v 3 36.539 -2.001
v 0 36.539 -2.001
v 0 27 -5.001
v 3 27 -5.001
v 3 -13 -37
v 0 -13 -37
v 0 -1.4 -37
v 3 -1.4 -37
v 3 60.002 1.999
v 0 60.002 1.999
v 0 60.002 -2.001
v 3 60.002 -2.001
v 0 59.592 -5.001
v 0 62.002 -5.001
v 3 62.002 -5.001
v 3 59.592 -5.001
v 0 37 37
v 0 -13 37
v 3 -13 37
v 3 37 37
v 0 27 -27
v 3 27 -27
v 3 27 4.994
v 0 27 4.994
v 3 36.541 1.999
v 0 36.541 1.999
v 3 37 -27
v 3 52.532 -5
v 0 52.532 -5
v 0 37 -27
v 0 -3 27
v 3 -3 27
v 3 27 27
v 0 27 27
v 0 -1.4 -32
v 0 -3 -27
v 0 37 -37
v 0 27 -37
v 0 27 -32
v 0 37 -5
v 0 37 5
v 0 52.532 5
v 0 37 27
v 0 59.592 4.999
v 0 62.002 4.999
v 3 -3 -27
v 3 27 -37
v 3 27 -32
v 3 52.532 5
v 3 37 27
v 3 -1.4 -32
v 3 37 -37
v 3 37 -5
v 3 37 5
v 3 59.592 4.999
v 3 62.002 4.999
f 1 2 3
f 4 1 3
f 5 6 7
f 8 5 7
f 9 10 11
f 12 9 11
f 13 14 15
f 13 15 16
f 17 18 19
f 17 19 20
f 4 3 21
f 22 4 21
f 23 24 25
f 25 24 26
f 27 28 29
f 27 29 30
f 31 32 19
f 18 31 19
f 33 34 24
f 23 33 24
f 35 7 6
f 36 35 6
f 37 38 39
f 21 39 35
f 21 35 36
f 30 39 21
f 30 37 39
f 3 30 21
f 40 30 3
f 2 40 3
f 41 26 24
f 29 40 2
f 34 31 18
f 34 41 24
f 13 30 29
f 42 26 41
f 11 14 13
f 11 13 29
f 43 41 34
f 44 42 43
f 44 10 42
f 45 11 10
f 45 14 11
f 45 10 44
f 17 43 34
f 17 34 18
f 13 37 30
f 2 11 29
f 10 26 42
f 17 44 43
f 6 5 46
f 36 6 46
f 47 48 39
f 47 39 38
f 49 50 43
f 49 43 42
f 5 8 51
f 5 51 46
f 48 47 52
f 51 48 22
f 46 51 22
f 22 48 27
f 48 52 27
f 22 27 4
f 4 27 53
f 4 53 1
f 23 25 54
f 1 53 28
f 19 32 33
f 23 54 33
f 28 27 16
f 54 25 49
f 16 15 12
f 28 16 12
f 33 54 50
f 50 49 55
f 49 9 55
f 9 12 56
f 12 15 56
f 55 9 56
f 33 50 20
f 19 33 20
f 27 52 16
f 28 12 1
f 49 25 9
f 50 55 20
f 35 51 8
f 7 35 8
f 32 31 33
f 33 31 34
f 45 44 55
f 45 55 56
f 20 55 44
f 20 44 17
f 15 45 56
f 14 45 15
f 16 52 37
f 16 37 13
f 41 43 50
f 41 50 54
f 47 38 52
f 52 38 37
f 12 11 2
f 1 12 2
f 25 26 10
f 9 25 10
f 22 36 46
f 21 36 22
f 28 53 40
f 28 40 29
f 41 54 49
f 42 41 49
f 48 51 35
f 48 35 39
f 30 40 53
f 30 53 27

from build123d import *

# Parameters (mm, degrees)
SKETCH2_W           = 74
SKETCH2_H           = 74
SKETCH2_W_2         = 54
SKETCH2_H_2         = 54
BOSS_EXTRUDE1_DEPTH = 3
SKETCH3_W           = 10
SKETCH3_H           = 25
BOSS_EXTRUDE2_DEPTH = 3
CUT_EXTRUDE1_DEPTH  = 3
BOSS_EXTRUDE3_DEPTH = 3
CUT_EXTRUDE2_DEPTH  = 3
CUT_EXTRUDE3_DEPTH  = 3
CUT_EXTRUDE4_DEPTH  = 3
BOSS_EXTRUDE4_DEPTH = 3
CUT_EXTRUDE6_DEPTH  = 3
SKETCH12_W          = 5
SKETCH12_H          = 28.4
CUT_EXTRUDE7_DEPTH  = 3


with BuildPart() as part:
    # Sketch2 → Boss-Extrude1 (new body)
    with BuildSketch(Plane(origin=(0, 0, 0), x_dir=(0, 0, -1), z_dir=(1, 0, 0))):
        Rectangle(SKETCH2_W, SKETCH2_H)
        Rectangle(SKETCH2_W_2, SKETCH2_H_2, mode=Mode.SUBTRACT)
    extrude(amount=BOSS_EXTRUDE1_DEPTH)

    # Sketch3 → Boss-Extrude2 (add)
    with BuildSketch(Plane(origin=(3, 0, 0), x_dir=(0, 0, -1), z_dir=(1, 0, 0))):
        with Locations((0, 49.5)):
            Rectangle(SKETCH3_W, SKETCH3_H)
    extrude(amount=-BOSS_EXTRUDE2_DEPTH)

    # Sketch4 → Cut-Extrude1 (cut)
    with BuildSketch(Plane.ZY):
        with BuildLine():
            ThreePointArc((-5, 57), (-3.535533906, 60.535533906), (0, 62))
            Line((0, 62), (-5, 62))
            Line((-5, 62), (-5, 57))
        make_face()
        with BuildLine():
            ThreePointArc((0, 62), (3.535533906, 60.535533906), (5, 57))
            Line((5, 57), (5, 62))
            Line((5, 62), (0, 62))
        make_face()
    extrude(amount=-CUT_EXTRUDE1_DEPTH, mode=Mode.SUBTRACT)

    # Sketch6 → Boss-Extrude3 (add)
    with BuildSketch(Plane(origin=(3, 0, 0), x_dir=(0, 0, -1), z_dir=(1, 0, 0))):
        with BuildLine():
            Line((0.000702858, 63.122185539), (-37, 37))
            Line((-37, 37), (-27, 37))
            Line((-27, 37), (-5, 52.531815276))
            Line((-5, 52.531815276), (-5, 57))
            ThreePointArc((-5, 57), (0, 62), (5, 57))
            Line((5, 57), (5, 52.531815276))
            Line((5, 52.531815276), (27, 37))
            Line((27, 37), (37, 37))
            Line((37, 37), (0.000702858, 63.122185539))
        make_face()
    extrude(amount=-BOSS_EXTRUDE3_DEPTH)

    # Sketch7 → Cut-Extrude2 (cut)
    with BuildSketch(Plane.ZY):
        with BuildLine():
            Line((2.883065745, 61.086269119), (-0.000702858, 63.122185539))
            Line((-0.000702858, 63.122185539), (-2.884435016, 61.086217499))
            ThreePointArc((-2.884435016, 61.086217499), (-0.000692829, 62.001640055), (2.883065745, 61.086269119))
        make_face()
    extrude(amount=-CUT_EXTRUDE2_DEPTH, mode=Mode.SUBTRACT)

    # Sketch8 → Cut-Extrude3 (cut)
    with BuildSketch(Plane(origin=(3, 0, 0), x_dir=(0, 0, -1), z_dir=(1, 0, 0))):
        with BuildLine():
            ThreePointArc((-27, -22.542313426), (-32.066565807, -20.638358178), (-37, -18.4120694))
            Line((-37, -18.4120694), (-37, -37))
            Line((-37, -37), (37, -37))
            Line((37, -37), (37, -18.412705326))
            ThreePointArc((37, -18.412705326), (32.066562187, -20.638895004), (27, -22.542753385))
            Line((27, -22.542753385), (27, -27))
            Line((27, -27), (0.00064811, -27))
            Line((0.00064811, -27), (-27, -27))
            Line((-27, -27), (-27, -22.542313426))
        make_face()
    extrude(amount=-CUT_EXTRUDE3_DEPTH, mode=Mode.SUBTRACT)

    # Sketch9 → Cut-Extrude4 (cut)
    with BuildSketch(Plane.ZY):
        Polygon((-2.000648078, 36.539392014), (-5.000648078, 27), (4.994412692, 27), (1.999351922, 36.540943925), (1.999351922, 60.001640055), (-2.000648078, 60.001640055), align=None)
    extrude(amount=-CUT_EXTRUDE4_DEPTH, mode=Mode.SUBTRACT)

    # Sketch10 → Boss-Extrude4 (add)
    with BuildSketch(Plane.ZY):
        with BuildLine():
            Line((-5.000648078, 62.001640055), (-5.000648078, 59.592132084))
            Line((-5.000648078, 59.592132084), (-2.884435016, 61.086217499))
            ThreePointArc((-2.884435016, 61.086217499), (-1.513445616, 61.767292541), (-0.000648078, 62.001640055))
            Line((-0.000648078, 62.001640055), (-5.000648078, 62.001640055))
        make_face()
        with BuildLine():
            ThreePointArc((-2.884435016, 61.086217499), (-4.440182664, 59.301755847), (-5.000648078, 57.001640055))
            ThreePointArc((-5.000648078, 57.001640055), (-4.18394821, 54.263027268), (-2.000648078, 52.41906436))
            Line((-2.000648078, 52.41906436), (-2.000648078, 60.001640055))
            Line((-2.000648078, 60.001640055), (1.999351922, 60.001640055))
            Line((1.999351922, 60.001640055), (1.999351922, 52.41906436))
            ThreePointArc((1.999351922, 52.41906436), (4.182652055, 54.263027268), (4.999351922, 57.001640055))
            ThreePointArc((4.999351922, 57.001640055), (4.438865922, 59.301795581), (2.883065745, 61.086269119))
            ThreePointArc((2.883065745, 61.086269119), (1.512106806, 61.76730608), (-0.000648078, 62.001640055))
            ThreePointArc((-0.000648078, 62.001640055), (-1.513445616, 61.767292541), (-2.884435016, 61.086217499))
        make_face()
        with BuildLine():
            Line((4.999351922, 62.001640055), (-0.000648078, 62.001640055))
            ThreePointArc((-0.000648078, 62.001640055), (1.512106806, 61.76730608), (2.883065745, 61.086269119))
            Line((2.883065745, 61.086269119), (4.999351922, 59.592188848))
            Line((4.999351922, 59.592188848), (4.999351922, 62.001640055))
        make_face()
    extrude(amount=-BOSS_EXTRUDE4_DEPTH)

    # Sketch11 → Cut-Extrude6 (cut)
    with BuildSketch(Plane(origin=(3, 0, 0), x_dir=(0, 0, -1), z_dir=(1, 0, 0))):
        Polygon((-27, -3), (-37, -13), (-37, -22.542313426), (-27, -22.542313426), align=None)
        Polygon((27, -3), (27, -22.542753385), (37, -22.542753385), (37, -13), align=None)
    extrude(amount=-CUT_EXTRUDE6_DEPTH, mode=Mode.SUBTRACT)

    # Sketch12 → Cut-Extrude7 (cut)
    with BuildSketch(Plane(origin=(3, 0, 0), x_dir=(0, 0, -1), z_dir=(1, 0, 0))):
        with Locations((34.5, 12.8)):
            Rectangle(SKETCH12_W, SKETCH12_H)
    extrude(amount=-CUT_EXTRUDE7_DEPTH, mode=Mode.SUBTRACT)


solid = part.part
